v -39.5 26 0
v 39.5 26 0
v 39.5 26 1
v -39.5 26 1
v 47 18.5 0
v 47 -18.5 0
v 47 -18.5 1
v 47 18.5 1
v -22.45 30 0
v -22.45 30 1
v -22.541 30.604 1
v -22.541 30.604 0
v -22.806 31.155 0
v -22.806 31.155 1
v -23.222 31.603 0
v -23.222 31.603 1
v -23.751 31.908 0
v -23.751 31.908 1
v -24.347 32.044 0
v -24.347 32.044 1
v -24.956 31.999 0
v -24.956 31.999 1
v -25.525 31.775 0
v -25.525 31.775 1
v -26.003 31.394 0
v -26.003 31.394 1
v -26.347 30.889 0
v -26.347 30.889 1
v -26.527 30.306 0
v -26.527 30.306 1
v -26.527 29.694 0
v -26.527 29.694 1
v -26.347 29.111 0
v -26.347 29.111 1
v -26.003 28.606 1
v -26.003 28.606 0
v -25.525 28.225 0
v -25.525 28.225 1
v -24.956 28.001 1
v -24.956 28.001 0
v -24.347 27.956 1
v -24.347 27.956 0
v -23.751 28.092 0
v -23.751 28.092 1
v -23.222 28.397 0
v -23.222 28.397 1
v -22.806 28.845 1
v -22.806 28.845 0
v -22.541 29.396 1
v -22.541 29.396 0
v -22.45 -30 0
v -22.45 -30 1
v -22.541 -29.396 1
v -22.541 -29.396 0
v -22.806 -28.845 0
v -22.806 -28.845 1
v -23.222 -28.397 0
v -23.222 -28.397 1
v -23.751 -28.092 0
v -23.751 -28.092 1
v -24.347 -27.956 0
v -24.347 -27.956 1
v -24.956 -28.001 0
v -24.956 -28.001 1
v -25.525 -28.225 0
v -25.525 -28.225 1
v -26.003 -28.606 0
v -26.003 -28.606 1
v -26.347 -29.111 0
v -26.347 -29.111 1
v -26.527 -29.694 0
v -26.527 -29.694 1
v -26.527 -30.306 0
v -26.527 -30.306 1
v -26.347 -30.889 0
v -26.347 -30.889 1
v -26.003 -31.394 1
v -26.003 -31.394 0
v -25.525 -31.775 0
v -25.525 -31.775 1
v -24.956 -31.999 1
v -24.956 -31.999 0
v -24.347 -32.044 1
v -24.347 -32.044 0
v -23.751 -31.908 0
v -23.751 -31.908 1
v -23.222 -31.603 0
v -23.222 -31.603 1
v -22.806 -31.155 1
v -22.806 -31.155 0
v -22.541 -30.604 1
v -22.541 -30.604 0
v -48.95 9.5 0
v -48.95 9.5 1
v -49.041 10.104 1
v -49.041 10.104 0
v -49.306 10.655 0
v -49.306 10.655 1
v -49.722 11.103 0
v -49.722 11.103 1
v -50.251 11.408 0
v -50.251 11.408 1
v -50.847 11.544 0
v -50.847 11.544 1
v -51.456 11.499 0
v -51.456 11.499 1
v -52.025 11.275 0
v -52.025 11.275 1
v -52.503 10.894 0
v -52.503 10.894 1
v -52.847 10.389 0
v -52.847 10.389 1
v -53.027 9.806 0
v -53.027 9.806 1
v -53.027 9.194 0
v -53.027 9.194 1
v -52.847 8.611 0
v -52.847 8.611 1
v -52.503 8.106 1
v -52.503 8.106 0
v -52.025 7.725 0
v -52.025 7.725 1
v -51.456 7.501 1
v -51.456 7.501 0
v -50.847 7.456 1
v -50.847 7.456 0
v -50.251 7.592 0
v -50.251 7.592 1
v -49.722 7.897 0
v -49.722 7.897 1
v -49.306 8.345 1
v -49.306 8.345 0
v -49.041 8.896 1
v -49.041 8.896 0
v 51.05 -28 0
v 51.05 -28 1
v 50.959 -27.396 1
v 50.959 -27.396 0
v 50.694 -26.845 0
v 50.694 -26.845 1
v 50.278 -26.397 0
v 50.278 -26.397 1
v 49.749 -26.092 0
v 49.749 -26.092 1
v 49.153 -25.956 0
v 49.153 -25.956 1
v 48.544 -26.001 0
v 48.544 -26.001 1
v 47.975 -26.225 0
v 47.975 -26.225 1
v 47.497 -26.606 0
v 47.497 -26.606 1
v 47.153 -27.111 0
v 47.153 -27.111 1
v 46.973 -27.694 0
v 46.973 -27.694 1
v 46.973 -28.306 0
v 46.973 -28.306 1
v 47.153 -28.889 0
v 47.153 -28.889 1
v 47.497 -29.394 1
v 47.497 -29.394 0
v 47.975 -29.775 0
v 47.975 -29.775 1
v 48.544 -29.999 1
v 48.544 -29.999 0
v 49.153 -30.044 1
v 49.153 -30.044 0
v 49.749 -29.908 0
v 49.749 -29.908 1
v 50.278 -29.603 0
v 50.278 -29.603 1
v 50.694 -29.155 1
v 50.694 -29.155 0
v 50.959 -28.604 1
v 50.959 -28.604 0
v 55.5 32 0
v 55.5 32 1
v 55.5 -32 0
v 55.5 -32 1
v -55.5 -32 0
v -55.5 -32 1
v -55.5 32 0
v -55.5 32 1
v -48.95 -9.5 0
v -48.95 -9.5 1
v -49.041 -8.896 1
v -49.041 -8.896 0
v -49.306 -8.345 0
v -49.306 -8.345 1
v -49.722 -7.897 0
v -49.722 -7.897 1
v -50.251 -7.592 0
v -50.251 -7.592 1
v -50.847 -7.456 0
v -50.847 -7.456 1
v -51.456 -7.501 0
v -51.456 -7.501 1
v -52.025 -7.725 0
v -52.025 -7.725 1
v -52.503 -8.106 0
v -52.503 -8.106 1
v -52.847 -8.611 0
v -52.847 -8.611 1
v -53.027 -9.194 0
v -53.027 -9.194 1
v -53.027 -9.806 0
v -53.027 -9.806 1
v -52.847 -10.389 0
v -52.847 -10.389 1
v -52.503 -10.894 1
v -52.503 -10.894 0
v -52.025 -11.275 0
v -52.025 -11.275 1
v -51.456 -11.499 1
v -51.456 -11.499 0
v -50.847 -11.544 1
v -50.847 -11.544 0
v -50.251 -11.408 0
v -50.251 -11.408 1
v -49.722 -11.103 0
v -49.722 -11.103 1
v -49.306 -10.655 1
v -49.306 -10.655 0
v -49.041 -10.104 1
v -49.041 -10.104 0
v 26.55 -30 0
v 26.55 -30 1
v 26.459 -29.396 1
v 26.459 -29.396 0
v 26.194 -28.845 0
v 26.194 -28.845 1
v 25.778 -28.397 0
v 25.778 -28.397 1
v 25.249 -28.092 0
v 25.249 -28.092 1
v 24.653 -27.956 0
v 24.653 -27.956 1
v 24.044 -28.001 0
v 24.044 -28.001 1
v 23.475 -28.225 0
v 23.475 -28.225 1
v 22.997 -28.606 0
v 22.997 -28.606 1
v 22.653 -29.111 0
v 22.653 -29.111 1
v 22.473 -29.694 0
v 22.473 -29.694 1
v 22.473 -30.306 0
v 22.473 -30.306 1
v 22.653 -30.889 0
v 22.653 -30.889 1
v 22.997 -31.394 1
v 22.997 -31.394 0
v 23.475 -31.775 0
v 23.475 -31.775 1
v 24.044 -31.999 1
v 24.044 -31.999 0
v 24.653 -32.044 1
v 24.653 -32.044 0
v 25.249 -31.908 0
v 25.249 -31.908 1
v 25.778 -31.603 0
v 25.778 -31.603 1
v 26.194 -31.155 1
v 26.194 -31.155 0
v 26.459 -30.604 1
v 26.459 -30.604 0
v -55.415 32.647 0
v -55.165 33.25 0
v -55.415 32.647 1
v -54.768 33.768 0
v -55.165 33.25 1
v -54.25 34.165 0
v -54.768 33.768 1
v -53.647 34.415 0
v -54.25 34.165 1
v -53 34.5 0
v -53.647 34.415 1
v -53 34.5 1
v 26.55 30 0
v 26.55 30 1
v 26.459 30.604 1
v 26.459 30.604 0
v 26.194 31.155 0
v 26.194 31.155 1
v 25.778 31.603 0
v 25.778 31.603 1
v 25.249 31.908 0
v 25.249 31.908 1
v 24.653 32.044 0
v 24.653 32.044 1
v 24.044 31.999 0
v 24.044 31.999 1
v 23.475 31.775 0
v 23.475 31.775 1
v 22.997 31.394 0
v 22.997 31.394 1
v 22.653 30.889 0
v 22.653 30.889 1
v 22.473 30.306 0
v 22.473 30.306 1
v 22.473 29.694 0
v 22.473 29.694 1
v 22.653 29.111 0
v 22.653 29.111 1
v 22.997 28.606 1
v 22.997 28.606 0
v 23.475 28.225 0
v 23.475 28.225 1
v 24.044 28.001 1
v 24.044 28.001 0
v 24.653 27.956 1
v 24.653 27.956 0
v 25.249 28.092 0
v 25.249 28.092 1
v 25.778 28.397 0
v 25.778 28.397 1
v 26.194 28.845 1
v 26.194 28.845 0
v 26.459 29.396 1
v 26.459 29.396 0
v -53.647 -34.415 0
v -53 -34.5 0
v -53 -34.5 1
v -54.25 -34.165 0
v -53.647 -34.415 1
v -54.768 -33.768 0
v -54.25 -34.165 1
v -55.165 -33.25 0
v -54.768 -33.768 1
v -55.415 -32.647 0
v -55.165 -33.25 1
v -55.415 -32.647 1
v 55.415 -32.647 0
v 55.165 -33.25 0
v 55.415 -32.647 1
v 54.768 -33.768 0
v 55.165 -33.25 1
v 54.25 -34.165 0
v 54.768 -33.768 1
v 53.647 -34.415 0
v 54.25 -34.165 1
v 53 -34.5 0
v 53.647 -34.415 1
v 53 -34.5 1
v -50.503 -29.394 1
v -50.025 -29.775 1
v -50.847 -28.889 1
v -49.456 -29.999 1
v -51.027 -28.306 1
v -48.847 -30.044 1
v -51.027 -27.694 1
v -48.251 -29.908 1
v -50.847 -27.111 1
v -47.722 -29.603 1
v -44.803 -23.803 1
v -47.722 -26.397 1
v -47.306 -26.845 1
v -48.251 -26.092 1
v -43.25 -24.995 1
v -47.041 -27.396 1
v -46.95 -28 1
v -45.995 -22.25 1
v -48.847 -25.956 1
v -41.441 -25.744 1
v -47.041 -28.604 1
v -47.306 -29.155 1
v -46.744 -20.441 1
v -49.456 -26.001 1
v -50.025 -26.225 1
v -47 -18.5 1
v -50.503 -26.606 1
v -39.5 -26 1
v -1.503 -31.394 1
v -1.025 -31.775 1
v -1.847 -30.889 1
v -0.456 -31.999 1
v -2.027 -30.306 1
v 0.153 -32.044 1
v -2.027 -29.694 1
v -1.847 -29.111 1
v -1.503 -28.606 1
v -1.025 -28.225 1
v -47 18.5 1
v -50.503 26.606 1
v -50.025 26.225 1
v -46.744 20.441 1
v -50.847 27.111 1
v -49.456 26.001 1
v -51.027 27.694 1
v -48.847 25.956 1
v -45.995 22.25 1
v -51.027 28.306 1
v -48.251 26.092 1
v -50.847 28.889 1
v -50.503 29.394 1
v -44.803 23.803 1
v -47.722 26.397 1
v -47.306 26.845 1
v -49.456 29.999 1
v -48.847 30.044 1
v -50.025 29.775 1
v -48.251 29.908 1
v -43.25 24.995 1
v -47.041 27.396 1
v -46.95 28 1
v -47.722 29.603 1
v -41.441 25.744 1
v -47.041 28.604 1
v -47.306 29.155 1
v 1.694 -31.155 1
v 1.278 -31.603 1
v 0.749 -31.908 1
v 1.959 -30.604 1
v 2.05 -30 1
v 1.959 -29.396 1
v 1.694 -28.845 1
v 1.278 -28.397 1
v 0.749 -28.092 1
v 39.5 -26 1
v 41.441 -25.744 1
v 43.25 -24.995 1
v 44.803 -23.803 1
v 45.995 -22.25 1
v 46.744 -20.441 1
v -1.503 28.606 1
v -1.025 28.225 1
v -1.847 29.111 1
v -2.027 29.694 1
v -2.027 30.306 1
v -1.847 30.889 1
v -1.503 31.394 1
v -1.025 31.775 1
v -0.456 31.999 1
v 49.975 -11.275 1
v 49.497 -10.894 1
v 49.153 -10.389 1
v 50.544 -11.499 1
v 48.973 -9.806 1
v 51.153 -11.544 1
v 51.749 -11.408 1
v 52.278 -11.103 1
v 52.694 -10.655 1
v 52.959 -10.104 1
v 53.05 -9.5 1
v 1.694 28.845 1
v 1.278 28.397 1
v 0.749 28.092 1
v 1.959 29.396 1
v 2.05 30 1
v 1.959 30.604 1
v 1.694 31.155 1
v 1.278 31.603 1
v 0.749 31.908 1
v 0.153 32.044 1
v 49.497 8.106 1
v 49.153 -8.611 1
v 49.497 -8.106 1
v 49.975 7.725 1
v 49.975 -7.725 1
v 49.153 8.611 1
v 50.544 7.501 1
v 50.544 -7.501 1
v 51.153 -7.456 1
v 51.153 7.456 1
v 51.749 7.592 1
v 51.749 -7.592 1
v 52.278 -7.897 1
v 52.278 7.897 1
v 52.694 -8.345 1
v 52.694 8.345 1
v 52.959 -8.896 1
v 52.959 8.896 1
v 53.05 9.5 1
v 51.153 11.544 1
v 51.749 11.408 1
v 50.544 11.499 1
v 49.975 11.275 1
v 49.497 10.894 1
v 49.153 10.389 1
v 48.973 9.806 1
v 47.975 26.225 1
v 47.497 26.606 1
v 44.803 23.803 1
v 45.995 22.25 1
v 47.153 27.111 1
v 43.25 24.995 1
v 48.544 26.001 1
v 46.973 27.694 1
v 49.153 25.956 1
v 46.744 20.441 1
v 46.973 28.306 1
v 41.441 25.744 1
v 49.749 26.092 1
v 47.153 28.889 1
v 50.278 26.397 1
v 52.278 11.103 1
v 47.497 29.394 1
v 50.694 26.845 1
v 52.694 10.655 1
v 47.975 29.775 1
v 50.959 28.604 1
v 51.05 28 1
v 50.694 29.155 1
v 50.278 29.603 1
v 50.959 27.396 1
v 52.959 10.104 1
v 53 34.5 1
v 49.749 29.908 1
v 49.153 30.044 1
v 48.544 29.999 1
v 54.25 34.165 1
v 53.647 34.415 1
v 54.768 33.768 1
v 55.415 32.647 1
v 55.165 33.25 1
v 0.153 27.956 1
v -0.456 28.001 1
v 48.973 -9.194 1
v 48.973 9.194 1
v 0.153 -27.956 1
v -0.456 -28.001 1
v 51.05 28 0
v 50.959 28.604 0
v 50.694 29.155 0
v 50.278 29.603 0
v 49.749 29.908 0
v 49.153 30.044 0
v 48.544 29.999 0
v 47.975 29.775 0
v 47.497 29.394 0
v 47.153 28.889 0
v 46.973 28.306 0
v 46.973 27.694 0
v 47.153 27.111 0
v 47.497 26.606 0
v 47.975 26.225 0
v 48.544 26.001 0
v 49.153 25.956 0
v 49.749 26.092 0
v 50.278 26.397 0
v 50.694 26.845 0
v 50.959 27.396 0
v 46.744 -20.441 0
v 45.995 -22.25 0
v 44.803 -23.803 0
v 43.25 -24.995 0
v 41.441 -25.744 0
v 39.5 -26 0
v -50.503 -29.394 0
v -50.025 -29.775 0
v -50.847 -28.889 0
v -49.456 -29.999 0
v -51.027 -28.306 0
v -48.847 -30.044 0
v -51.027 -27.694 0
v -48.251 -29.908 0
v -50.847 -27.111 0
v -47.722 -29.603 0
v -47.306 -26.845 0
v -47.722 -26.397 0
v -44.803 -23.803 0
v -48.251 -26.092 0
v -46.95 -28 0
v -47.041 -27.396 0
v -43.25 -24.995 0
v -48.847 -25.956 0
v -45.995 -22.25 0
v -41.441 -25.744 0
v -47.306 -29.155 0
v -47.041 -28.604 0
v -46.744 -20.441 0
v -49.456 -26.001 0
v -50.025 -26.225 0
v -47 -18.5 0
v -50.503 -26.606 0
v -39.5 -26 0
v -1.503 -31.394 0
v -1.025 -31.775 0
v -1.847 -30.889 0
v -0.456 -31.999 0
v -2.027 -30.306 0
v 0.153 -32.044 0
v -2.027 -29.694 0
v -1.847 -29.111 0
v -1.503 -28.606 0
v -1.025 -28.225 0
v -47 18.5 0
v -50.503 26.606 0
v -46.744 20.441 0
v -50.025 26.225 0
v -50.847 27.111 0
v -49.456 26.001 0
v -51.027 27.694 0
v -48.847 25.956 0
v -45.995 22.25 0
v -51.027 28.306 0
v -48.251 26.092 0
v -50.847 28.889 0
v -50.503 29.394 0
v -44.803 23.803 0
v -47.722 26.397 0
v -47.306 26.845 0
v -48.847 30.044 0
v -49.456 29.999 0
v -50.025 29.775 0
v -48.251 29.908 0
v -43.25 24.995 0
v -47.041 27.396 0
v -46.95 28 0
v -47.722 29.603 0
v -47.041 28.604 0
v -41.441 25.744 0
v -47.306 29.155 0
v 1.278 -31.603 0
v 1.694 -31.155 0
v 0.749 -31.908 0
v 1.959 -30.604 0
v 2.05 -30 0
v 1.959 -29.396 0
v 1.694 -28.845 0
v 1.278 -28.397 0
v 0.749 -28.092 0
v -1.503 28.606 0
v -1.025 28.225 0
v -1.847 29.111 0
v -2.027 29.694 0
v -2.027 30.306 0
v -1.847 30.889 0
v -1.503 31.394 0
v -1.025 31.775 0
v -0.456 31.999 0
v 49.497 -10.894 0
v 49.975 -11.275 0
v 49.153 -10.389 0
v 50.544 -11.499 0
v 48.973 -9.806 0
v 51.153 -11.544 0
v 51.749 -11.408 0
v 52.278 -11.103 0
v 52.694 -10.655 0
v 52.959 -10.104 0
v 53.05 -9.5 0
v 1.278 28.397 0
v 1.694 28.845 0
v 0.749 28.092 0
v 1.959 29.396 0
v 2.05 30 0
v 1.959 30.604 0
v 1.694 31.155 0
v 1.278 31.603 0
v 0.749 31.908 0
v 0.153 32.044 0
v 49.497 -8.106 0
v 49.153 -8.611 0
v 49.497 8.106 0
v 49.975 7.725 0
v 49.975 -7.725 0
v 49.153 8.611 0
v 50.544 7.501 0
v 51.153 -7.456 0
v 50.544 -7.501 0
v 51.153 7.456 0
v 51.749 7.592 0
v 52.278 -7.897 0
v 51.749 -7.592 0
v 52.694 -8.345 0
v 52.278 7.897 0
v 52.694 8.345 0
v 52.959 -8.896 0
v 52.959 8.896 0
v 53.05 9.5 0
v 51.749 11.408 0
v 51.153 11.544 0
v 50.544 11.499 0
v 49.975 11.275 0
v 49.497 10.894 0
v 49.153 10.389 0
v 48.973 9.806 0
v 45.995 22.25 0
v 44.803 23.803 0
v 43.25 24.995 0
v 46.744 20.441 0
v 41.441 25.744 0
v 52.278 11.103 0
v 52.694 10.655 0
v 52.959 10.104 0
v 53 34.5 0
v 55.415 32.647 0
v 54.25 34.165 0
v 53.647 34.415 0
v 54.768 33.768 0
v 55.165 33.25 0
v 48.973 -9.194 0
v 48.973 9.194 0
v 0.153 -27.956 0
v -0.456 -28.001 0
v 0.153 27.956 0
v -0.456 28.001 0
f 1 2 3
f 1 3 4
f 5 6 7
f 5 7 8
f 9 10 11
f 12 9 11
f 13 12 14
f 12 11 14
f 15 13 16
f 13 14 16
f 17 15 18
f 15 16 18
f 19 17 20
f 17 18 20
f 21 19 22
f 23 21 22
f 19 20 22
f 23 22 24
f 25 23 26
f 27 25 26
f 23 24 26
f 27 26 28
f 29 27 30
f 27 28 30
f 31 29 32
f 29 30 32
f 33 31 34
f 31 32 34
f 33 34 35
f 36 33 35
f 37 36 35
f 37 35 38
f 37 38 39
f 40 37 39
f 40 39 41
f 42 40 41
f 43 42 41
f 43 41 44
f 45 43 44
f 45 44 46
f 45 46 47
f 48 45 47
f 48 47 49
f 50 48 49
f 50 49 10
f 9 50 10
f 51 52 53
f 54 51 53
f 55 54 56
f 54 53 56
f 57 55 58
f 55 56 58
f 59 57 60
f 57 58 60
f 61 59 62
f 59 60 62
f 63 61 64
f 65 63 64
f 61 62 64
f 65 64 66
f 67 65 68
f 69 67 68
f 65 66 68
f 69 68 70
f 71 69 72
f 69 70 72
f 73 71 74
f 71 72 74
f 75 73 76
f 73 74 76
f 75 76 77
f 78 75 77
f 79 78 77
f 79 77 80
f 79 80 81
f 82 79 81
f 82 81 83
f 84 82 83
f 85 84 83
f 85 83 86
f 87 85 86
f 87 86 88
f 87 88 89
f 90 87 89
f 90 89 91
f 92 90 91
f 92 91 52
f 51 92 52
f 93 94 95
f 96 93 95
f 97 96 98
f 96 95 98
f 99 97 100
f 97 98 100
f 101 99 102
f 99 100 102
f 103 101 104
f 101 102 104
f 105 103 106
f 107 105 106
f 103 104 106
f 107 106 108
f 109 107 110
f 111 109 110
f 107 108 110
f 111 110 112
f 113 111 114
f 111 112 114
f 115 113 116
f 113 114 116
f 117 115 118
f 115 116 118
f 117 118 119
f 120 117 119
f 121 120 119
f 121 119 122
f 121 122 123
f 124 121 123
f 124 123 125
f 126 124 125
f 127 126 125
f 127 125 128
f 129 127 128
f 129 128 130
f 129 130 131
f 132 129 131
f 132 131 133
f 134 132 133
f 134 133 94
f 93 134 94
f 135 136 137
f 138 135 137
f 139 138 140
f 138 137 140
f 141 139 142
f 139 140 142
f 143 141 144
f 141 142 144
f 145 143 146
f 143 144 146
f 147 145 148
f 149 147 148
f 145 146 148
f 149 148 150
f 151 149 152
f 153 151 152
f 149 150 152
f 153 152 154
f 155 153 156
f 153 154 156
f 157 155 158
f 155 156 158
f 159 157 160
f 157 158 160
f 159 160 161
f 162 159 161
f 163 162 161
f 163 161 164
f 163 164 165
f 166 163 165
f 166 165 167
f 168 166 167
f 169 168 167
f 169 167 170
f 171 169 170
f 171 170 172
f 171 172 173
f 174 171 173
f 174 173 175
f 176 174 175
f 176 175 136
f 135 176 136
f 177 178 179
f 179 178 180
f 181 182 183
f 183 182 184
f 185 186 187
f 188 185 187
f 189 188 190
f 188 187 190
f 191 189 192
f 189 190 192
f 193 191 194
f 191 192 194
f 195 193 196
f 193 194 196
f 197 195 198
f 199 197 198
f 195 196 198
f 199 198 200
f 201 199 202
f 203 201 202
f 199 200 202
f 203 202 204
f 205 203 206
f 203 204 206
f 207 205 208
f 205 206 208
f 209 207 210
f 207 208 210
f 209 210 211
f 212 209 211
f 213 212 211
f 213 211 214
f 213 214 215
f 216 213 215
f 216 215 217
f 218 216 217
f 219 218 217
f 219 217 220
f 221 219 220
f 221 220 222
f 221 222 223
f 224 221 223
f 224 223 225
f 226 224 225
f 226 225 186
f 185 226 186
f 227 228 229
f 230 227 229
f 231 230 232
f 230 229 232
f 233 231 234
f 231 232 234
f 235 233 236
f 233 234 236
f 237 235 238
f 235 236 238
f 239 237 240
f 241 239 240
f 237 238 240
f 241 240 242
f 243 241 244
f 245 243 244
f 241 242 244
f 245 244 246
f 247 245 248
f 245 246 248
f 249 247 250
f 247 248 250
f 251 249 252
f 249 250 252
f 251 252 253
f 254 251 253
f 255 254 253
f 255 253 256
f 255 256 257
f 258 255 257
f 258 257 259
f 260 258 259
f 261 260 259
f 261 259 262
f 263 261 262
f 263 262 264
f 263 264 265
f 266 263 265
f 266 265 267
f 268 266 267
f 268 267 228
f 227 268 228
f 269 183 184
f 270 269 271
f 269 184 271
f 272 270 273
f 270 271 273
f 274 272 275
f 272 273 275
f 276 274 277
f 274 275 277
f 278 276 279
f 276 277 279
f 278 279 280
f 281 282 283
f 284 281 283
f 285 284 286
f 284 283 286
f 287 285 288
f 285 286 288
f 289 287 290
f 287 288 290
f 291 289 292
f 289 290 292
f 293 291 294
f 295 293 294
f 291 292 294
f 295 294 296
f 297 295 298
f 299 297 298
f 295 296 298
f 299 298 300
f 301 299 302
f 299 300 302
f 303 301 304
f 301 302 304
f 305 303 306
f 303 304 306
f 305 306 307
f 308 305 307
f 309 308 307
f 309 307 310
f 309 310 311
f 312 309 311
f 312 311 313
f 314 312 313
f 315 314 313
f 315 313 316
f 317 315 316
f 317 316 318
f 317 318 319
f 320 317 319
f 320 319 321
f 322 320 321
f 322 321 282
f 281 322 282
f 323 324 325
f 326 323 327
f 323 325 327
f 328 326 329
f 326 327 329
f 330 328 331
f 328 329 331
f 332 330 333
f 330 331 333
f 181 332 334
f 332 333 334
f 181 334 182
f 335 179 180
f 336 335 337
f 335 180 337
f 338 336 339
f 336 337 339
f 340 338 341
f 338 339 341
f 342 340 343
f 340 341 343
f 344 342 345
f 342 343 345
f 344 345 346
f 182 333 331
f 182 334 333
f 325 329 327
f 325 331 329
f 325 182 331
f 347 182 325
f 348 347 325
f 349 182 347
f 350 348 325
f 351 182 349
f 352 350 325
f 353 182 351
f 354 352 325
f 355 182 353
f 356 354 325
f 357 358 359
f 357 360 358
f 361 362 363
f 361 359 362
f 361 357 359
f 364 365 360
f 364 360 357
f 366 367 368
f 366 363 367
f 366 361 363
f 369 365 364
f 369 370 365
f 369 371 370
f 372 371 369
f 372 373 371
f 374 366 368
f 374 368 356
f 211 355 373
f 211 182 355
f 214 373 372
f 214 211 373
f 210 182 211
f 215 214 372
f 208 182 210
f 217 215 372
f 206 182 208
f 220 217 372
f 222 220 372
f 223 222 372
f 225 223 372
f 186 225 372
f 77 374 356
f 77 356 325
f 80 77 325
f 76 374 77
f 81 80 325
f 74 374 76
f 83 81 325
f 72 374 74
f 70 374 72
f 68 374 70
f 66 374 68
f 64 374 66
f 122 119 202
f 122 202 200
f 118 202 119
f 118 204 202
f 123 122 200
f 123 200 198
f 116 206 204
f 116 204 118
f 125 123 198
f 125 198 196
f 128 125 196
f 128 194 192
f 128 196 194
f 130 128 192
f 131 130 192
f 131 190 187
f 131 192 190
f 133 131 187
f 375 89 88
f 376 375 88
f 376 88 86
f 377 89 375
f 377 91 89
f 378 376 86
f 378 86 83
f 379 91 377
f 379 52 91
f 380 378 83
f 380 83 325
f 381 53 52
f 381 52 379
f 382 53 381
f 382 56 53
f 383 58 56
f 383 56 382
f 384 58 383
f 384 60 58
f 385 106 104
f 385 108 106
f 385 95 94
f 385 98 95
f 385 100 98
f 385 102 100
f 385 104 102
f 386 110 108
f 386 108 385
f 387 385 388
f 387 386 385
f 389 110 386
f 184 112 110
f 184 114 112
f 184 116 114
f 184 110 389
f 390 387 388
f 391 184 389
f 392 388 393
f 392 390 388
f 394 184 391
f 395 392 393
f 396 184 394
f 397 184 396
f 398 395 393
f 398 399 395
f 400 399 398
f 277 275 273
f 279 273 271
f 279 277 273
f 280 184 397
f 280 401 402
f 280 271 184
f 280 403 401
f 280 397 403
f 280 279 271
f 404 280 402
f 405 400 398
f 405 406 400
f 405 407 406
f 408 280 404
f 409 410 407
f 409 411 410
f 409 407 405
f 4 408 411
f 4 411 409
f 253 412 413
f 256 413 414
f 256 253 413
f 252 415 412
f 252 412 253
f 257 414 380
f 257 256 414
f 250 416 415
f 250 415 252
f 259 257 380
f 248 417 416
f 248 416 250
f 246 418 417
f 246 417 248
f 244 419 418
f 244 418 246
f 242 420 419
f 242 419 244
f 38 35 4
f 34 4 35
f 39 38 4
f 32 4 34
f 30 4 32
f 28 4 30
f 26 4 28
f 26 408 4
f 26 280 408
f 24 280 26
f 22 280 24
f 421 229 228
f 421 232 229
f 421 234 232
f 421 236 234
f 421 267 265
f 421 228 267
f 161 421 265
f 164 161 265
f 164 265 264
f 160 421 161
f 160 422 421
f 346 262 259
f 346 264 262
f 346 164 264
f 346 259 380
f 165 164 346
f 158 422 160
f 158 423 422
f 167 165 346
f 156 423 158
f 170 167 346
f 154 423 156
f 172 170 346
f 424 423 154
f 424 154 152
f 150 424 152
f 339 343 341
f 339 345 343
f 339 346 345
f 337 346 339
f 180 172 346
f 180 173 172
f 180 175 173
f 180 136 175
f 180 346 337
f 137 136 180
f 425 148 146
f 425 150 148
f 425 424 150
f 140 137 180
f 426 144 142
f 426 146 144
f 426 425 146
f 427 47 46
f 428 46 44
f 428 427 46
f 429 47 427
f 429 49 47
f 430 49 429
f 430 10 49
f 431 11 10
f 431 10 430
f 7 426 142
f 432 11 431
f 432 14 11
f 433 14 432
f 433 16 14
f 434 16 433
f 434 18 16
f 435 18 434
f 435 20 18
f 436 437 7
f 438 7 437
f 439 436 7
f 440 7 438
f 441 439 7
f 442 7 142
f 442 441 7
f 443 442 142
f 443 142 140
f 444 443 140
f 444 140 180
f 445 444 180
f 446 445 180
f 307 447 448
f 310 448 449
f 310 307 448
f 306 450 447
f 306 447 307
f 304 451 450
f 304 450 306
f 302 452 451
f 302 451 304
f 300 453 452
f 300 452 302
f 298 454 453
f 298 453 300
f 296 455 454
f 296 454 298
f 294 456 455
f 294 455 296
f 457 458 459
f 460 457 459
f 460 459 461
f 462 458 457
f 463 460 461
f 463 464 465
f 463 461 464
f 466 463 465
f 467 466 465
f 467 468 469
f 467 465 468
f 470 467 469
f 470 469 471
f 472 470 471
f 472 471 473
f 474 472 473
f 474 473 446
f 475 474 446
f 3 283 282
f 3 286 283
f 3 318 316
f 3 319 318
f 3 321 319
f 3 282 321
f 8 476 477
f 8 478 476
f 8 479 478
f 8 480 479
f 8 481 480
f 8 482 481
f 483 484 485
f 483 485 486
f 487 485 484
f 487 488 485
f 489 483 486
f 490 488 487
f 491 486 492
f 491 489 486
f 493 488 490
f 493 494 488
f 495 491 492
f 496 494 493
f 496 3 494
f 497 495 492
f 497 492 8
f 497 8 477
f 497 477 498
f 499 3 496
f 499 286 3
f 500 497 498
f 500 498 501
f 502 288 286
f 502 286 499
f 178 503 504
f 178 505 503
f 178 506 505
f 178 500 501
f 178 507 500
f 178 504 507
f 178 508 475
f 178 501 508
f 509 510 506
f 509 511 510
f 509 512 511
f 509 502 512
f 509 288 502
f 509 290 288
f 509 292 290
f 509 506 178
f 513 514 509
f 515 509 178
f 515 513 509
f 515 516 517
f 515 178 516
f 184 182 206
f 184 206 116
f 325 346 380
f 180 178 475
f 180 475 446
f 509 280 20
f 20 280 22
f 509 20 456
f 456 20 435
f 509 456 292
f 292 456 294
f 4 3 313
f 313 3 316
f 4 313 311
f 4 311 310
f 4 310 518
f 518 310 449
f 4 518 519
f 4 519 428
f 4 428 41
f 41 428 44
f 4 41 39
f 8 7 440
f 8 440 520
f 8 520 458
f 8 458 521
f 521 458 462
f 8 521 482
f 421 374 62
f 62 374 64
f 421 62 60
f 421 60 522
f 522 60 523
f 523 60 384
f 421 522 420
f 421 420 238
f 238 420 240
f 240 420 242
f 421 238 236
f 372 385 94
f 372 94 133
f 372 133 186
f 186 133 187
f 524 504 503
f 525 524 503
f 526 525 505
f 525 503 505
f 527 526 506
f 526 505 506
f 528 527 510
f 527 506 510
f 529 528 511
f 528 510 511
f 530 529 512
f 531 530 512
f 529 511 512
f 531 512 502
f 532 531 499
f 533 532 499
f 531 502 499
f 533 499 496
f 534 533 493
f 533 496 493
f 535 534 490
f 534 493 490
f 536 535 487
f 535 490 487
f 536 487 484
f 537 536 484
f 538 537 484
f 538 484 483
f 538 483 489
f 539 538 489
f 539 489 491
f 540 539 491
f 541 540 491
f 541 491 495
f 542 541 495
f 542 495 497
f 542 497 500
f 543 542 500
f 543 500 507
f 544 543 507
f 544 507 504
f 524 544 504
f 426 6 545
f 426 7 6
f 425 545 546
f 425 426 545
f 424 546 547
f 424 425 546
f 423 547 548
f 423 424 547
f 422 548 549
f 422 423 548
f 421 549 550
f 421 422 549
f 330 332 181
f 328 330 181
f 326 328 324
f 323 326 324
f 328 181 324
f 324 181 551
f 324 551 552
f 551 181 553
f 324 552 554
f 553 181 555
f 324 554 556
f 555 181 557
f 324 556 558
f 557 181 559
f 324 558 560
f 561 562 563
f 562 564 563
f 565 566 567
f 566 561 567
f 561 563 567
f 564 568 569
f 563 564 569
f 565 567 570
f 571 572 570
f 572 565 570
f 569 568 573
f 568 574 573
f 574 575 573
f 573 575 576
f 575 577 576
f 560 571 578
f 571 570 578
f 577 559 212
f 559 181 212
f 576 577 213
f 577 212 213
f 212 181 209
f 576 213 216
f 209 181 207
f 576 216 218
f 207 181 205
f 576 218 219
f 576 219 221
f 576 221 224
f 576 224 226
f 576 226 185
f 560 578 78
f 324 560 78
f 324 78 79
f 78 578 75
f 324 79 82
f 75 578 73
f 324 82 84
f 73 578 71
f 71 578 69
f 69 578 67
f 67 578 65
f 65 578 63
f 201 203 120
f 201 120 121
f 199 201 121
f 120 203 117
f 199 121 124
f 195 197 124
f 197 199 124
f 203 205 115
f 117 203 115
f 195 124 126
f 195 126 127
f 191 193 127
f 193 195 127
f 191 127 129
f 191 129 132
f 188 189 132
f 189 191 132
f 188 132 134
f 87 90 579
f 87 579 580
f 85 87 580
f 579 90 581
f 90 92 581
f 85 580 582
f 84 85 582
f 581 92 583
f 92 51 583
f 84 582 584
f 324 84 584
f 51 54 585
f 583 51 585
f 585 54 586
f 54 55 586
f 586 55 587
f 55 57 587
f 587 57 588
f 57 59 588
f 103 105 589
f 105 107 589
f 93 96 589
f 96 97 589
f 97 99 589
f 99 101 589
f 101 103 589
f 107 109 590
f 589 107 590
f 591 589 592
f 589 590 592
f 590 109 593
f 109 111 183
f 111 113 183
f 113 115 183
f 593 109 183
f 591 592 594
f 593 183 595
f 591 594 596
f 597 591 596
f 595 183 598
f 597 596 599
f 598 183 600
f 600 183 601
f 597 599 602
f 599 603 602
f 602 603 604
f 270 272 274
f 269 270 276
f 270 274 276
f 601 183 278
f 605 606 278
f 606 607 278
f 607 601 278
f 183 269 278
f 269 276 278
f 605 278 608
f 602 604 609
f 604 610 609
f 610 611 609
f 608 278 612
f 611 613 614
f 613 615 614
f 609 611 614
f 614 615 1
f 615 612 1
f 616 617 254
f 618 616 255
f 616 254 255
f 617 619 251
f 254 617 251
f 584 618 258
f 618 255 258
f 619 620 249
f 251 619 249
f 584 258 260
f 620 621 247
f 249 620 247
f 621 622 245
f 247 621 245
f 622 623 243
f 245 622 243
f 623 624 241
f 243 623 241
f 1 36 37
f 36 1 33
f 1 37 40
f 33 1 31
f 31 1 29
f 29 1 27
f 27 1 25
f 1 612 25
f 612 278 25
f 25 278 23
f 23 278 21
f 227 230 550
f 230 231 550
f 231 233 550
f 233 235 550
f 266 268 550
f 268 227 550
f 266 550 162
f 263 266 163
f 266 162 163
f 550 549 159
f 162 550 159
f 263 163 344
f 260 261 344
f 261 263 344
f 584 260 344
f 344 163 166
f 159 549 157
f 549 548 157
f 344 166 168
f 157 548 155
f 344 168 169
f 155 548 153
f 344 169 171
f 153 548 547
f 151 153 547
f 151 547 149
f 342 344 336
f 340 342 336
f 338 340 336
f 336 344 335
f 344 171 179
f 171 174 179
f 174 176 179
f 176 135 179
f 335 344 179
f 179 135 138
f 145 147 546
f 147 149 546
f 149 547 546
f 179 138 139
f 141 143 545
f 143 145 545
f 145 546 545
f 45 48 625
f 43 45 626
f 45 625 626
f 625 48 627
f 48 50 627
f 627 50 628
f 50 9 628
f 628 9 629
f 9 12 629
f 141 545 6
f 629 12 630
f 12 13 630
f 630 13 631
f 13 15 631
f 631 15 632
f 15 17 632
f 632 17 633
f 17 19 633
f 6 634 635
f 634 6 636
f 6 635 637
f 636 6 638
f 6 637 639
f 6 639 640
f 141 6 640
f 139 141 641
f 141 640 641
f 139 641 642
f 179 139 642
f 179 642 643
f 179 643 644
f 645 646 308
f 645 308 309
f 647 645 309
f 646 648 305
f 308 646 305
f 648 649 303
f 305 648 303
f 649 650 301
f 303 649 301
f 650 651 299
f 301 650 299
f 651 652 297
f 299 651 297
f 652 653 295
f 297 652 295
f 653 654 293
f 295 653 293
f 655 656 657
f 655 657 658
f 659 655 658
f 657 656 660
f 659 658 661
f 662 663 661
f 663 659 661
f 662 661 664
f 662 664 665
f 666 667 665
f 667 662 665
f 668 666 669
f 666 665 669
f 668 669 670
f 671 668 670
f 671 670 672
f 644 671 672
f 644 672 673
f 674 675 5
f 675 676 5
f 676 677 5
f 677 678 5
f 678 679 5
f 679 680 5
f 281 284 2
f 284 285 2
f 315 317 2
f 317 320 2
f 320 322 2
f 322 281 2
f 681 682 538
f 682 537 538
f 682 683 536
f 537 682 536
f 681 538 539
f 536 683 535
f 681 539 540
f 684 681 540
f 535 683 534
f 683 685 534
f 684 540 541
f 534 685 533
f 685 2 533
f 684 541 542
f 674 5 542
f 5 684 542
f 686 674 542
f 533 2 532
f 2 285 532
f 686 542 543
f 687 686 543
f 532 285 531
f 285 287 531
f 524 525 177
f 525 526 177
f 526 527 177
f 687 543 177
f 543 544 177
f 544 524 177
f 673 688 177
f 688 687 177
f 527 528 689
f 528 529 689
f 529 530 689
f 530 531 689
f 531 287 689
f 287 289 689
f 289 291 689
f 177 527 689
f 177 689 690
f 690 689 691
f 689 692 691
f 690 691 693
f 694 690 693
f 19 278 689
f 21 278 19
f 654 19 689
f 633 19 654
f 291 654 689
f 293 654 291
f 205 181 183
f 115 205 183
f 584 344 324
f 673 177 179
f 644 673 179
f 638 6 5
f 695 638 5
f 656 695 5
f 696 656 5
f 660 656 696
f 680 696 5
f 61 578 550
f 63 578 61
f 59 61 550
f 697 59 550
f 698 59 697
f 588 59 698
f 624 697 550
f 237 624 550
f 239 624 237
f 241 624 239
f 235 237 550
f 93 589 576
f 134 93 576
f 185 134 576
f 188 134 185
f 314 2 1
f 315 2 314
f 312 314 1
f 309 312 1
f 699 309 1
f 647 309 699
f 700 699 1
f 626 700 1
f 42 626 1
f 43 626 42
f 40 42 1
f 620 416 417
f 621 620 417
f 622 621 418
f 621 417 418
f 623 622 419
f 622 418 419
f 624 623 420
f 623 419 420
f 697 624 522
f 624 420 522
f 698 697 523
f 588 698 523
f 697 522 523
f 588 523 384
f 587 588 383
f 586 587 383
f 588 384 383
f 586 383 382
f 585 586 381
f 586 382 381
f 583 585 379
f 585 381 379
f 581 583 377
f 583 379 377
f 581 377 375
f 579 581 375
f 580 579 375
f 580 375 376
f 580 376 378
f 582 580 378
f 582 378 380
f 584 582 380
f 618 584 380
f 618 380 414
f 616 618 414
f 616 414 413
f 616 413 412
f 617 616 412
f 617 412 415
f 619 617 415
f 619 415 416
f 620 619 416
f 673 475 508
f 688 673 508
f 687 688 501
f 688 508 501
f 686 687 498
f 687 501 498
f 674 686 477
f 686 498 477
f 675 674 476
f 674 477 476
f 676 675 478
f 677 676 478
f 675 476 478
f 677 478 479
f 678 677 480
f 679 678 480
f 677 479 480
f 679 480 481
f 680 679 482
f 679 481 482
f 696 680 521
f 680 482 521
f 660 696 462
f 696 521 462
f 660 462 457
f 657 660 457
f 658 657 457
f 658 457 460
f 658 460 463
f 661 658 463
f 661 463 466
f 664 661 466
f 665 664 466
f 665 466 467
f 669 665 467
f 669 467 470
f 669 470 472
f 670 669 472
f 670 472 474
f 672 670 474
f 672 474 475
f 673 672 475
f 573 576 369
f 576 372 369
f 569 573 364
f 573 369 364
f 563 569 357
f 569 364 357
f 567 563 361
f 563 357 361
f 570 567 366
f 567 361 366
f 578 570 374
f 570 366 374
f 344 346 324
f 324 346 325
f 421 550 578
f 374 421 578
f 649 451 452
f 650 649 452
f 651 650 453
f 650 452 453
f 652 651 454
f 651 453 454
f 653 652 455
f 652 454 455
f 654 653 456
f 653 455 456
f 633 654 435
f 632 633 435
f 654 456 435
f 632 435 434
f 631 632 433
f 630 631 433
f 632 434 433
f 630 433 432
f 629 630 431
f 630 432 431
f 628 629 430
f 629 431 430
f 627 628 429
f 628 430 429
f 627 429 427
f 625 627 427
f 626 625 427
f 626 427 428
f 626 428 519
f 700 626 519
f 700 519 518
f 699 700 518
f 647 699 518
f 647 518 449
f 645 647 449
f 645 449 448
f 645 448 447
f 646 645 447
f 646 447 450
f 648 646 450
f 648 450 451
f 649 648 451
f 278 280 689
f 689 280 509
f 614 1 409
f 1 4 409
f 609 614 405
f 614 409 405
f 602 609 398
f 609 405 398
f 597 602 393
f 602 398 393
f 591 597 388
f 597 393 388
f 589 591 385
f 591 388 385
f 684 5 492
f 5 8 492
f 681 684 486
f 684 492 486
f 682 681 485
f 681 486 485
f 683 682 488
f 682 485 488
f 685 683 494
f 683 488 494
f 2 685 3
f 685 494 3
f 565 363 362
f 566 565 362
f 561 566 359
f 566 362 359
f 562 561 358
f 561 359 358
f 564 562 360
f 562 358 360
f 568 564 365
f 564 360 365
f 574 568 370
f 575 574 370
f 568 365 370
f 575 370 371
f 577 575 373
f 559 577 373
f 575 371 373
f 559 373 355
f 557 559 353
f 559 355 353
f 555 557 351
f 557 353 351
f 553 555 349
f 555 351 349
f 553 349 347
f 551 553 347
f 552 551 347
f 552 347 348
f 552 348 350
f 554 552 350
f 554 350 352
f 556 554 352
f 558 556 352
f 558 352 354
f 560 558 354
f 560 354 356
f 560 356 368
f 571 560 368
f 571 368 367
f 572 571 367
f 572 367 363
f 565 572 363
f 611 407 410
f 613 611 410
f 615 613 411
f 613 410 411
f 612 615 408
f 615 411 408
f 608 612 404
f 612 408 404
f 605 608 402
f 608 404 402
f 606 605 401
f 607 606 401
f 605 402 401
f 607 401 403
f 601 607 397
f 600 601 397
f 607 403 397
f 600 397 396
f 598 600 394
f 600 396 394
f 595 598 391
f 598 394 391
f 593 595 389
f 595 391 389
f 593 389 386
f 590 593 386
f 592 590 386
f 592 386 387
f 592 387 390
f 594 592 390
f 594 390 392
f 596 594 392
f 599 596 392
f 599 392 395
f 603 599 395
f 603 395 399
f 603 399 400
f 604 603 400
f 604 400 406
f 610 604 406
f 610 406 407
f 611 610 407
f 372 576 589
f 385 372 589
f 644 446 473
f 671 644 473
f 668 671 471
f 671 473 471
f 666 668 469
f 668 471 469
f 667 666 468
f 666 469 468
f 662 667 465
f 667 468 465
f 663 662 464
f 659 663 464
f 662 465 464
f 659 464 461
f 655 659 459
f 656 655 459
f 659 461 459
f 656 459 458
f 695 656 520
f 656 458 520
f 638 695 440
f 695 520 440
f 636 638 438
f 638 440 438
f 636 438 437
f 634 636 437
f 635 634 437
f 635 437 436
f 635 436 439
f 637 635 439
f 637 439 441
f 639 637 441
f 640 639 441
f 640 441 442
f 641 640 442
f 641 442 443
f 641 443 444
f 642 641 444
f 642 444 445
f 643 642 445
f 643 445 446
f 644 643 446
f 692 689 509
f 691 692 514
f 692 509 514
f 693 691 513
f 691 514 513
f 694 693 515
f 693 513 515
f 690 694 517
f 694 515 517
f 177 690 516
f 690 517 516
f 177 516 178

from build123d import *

# Parameters (mm, degrees)
SKETCH1_W           = 112
SKETCH1_H           = 70
BOSS_EXTRUDE1_DEPTH = 1
FILLET1_R           = 3
SKETCH3_W           = 94
SKETCH3_H           = 52
CUT_EXTRUDE2_DEPTH  = 67.045438904
FILLET2_R           = 7.5
CUT_EXTRUDE3_REACH  = 68.045
SKETCH4_R           = 1.6
SKETCH5_R           = 2.05
CUT_EXTRUDE4_DEPTH  = 67.045438904
SKETCH6_W           = 132
SKETCH6_H           = 90
CUT_EXTRUDE5_DEPTH  = 67.045438904


with BuildPart() as part:
    # Sketch1 → Boss-Extrude1 (new body)
    with BuildSketch(Plane.XY):
        Rectangle(SKETCH1_W, SKETCH1_H)
    extrude(amount=BOSS_EXTRUDE1_DEPTH)

    # Fillet1
    fillet1_edges = [part.edges().sort_by_distance(p)[0] for p in [
        (-56, 35, 0.5),
        (56, 35, 0.5),
        (56, -35, 0.5),
        (-56, -35, 0.5),
    ]]
    fillet(fillet1_edges, radius=FILLET1_R)

    # Sketch3 → Cut-Extrude2 (cut, through all)
    with BuildSketch(Plane(origin=(0, 0, 0), x_dir=(-1, 0, 0), z_dir=(0, 0, -1))):
        Rectangle(SKETCH3_W, SKETCH3_H)
    extrude(amount=-CUT_EXTRUDE2_DEPTH, mode=Mode.SUBTRACT)

    # Fillet2
    fillet2_edges = [part.edges().sort_by_distance(p)[0] for p in [
        (-47, 26, 0.5),
        (-47, -26, 0.5),
        (47, -26, 0.5),
        (47, 26, 0.5),
    ]]
    fillet(fillet2_edges, radius=FILLET2_R)

    # Sketch4 → Cut-Extrude3 (cut, up to next)
    with BuildSketch(Plane(origin=(0, 0, 0), x_dir=(-1, 0, 0), z_dir=(0, 0, -1)), mode=Mode.PRIVATE) as cut_extrude3_sk1:
        with Locations((49, -28)):
            Circle(SKETCH4_R)
    cut_extrude3_tool1 = extrude(cut_extrude3_sk1.sketch, amount=-CUT_EXTRUDE3_REACH, mode=Mode.PRIVATE) & part.part
    # Sketch4 → Cut-Extrude3 (cut, up to next)
    with BuildSketch(Plane(origin=(0, 0, 0), x_dir=(-1, 0, 0), z_dir=(0, 0, -1)), mode=Mode.PRIVATE) as cut_extrude3_sk2:
        with Locations((24.5, -30)):
            Circle(SKETCH4_R)
    cut_extrude3_tool2 = extrude(cut_extrude3_sk2.sketch, amount=-CUT_EXTRUDE3_REACH, mode=Mode.PRIVATE) & part.part
    # Sketch4 → Cut-Extrude3 (cut, up to next)
    with BuildSketch(Plane(origin=(0, 0, 0), x_dir=(-1, 0, 0), z_dir=(0, 0, -1)), mode=Mode.PRIVATE) as cut_extrude3_sk3:
        with Locations((0, -30)):
            Circle(SKETCH4_R)
    cut_extrude3_tool3 = extrude(cut_extrude3_sk3.sketch, amount=-CUT_EXTRUDE3_REACH, mode=Mode.PRIVATE) & part.part
    # Sketch4 → Cut-Extrude3 (cut, up to next)
    with BuildSketch(Plane(origin=(0, 0, 0), x_dir=(-1, 0, 0), z_dir=(0, 0, -1)), mode=Mode.PRIVATE) as cut_extrude3_sk4:
        with Locations((-24.5, -30)):
            Circle(SKETCH4_R)
    cut_extrude3_tool4 = extrude(cut_extrude3_sk4.sketch, amount=-CUT_EXTRUDE3_REACH, mode=Mode.PRIVATE) & part.part
    # Sketch4 → Cut-Extrude3 (cut, up to next)
    with BuildSketch(Plane(origin=(0, 0, 0), x_dir=(-1, 0, 0), z_dir=(0, 0, -1)), mode=Mode.PRIVATE) as cut_extrude3_sk5:
        with Locations((-49, -28)):
            Circle(SKETCH4_R)
    cut_extrude3_tool5 = extrude(cut_extrude3_sk5.sketch, amount=-CUT_EXTRUDE3_REACH, mode=Mode.PRIVATE) & part.part
    # Sketch4 → Cut-Extrude3 (cut, up to next)
    with BuildSketch(Plane(origin=(0, 0, 0), x_dir=(-1, 0, 0), z_dir=(0, 0, -1)), mode=Mode.PRIVATE) as cut_extrude3_sk6:
        with Locations((-51, -9.5)):
            Circle(SKETCH4_R)
    cut_extrude3_tool6 = extrude(cut_extrude3_sk6.sketch, amount=-CUT_EXTRUDE3_REACH, mode=Mode.PRIVATE) & part.part
    # Sketch4 → Cut-Extrude3 (cut, up to next)
    with BuildSketch(Plane(origin=(0, 0, 0), x_dir=(-1, 0, 0), z_dir=(0, 0, -1)), mode=Mode.PRIVATE) as cut_extrude3_sk7:
        with Locations((-51, 9.5)):
            Circle(SKETCH4_R)
    cut_extrude3_tool7 = extrude(cut_extrude3_sk7.sketch, amount=-CUT_EXTRUDE3_REACH, mode=Mode.PRIVATE) & part.part
    # Sketch4 → Cut-Extrude3 (cut, up to next)
    with BuildSketch(Plane(origin=(0, 0, 0), x_dir=(-1, 0, 0), z_dir=(0, 0, -1)), mode=Mode.PRIVATE) as cut_extrude3_sk8:
        with Locations((-49, 28)):
            Circle(SKETCH4_R)
    cut_extrude3_tool8 = extrude(cut_extrude3_sk8.sketch, amount=-CUT_EXTRUDE3_REACH, mode=Mode.PRIVATE) & part.part
    # Sketch4 → Cut-Extrude3 (cut, up to next)
    with BuildSketch(Plane(origin=(0, 0, 0), x_dir=(-1, 0, 0), z_dir=(0, 0, -1)), mode=Mode.PRIVATE) as cut_extrude3_sk9:
        with Locations((-24.5, 30)):
            Circle(SKETCH4_R)
    cut_extrude3_tool9 = extrude(cut_extrude3_sk9.sketch, amount=-CUT_EXTRUDE3_REACH, mode=Mode.PRIVATE) & part.part
    # Sketch4 → Cut-Extrude3 (cut, up to next)
    with BuildSketch(Plane(origin=(0, 0, 0), x_dir=(-1, 0, 0), z_dir=(0, 0, -1)), mode=Mode.PRIVATE) as cut_extrude3_sk10:
        with Locations((0, 30)):
            Circle(SKETCH4_R)
    cut_extrude3_tool10 = extrude(cut_extrude3_sk10.sketch, amount=-CUT_EXTRUDE3_REACH, mode=Mode.PRIVATE) & part.part
    # Sketch4 → Cut-Extrude3 (cut, up to next)
    with BuildSketch(Plane(origin=(0, 0, 0), x_dir=(-1, 0, 0), z_dir=(0, 0, -1)), mode=Mode.PRIVATE) as cut_extrude3_sk11:
        with Locations((24.5, 30)):
            Circle(SKETCH4_R)
    cut_extrude3_tool11 = extrude(cut_extrude3_sk11.sketch, amount=-CUT_EXTRUDE3_REACH, mode=Mode.PRIVATE) & part.part
    # Sketch4 → Cut-Extrude3 (cut, up to next)
    with BuildSketch(Plane(origin=(0, 0, 0), x_dir=(-1, 0, 0), z_dir=(0, 0, -1)), mode=Mode.PRIVATE) as cut_extrude3_sk12:
        with Locations((49, 28)):
            Circle(SKETCH4_R)
    cut_extrude3_tool12 = extrude(cut_extrude3_sk12.sketch, amount=-CUT_EXTRUDE3_REACH, mode=Mode.PRIVATE) & part.part
    # Sketch4 → Cut-Extrude3 (cut, up to next)
    with BuildSketch(Plane(origin=(0, 0, 0), x_dir=(-1, 0, 0), z_dir=(0, 0, -1)), mode=Mode.PRIVATE) as cut_extrude3_sk13:
        with Locations((51, 9.5)):
            Circle(SKETCH4_R)
    cut_extrude3_tool13 = extrude(cut_extrude3_sk13.sketch, amount=-CUT_EXTRUDE3_REACH, mode=Mode.PRIVATE) & part.part
    # Sketch4 → Cut-Extrude3 (cut, up to next)
    with BuildSketch(Plane(origin=(0, 0, 0), x_dir=(-1, 0, 0), z_dir=(0, 0, -1)), mode=Mode.PRIVATE) as cut_extrude3_sk14:
        with Locations((51, -9.5)):
            Circle(SKETCH4_R)
    cut_extrude3_tool14 = extrude(cut_extrude3_sk14.sketch, amount=-CUT_EXTRUDE3_REACH, mode=Mode.PRIVATE) & part.part
    add(cut_extrude3_tool1.solids().sort_by_distance((-49, -28, 0))[0], mode=Mode.SUBTRACT)
    add(cut_extrude3_tool2.solids().sort_by_distance((-24.5, -30, 0))[0], mode=Mode.SUBTRACT)
    add(cut_extrude3_tool3.solids().sort_by_distance((0, -30, 0))[0], mode=Mode.SUBTRACT)
    add(cut_extrude3_tool4.solids().sort_by_distance((24.5, -30, 0))[0], mode=Mode.SUBTRACT)
    add(cut_extrude3_tool5.solids().sort_by_distance((49, -28, 0))[0], mode=Mode.SUBTRACT)
    add(cut_extrude3_tool6.solids().sort_by_distance((51, -9.5, 0))[0], mode=Mode.SUBTRACT)
    add(cut_extrude3_tool7.solids().sort_by_distance((51, 9.5, 0))[0], mode=Mode.SUBTRACT)
    add(cut_extrude3_tool8.solids().sort_by_distance((49, 28, 0))[0], mode=Mode.SUBTRACT)
    add(cut_extrude3_tool9.solids().sort_by_distance((24.5, 30, 0))[0], mode=Mode.SUBTRACT)
    add(cut_extrude3_tool10.solids().sort_by_distance((0, 30, 0))[0], mode=Mode.SUBTRACT)
    add(cut_extrude3_tool11.solids().sort_by_distance((-24.5, 30, 0))[0], mode=Mode.SUBTRACT)
    add(cut_extrude3_tool12.solids().sort_by_distance((-49, 28, 0))[0], mode=Mode.SUBTRACT)
    add(cut_extrude3_tool13.solids().sort_by_distance((-51, 9.5, 0))[0], mode=Mode.SUBTRACT)
    add(cut_extrude3_tool14.solids().sort_by_distance((-51, -9.5, 0))[0], mode=Mode.SUBTRACT)

    # Sketch5 → Cut-Extrude4 (cut, through all)
    with BuildSketch(Plane.XY.offset(1)):
        with Locations((-49, 28)):
            Circle(SKETCH5_R)
        with Locations((-24.5, 30)):
            Circle(SKETCH5_R)
        with Locations((0, 30)):
            Circle(SKETCH5_R)
        with Locations((24.5, 30)):
            Circle(SKETCH5_R)
        with Locations((49, 28)):
            Circle(SKETCH5_R)
        with Locations((51, 9.5)):
            Circle(SKETCH5_R)
        with Locations((51, -9.5)):
            Circle(SKETCH5_R)
        with Locations((49, -28)):
            Circle(SKETCH5_R)
        with Locations((24.5, -30)):
            Circle(SKETCH5_R)
        with Locations((0, -30)):
            Circle(SKETCH5_R)
        with Locations((-24.5, -30)):
            Circle(SKETCH5_R)
        with Locations((-49, -28)):
            Circle(SKETCH5_R)
        with Locations((-51, -9.5)):
            Circle(SKETCH5_R)
        with Locations((-51, 9.5)):
            Circle(SKETCH5_R)
    extrude(amount=-CUT_EXTRUDE4_DEPTH, mode=Mode.SUBTRACT)

    # Sketch6 → Cut-Extrude5 (cut, through all)
    with BuildSketch(Plane.XY.offset(1)):
        Rectangle(SKETCH6_W, SKETCH6_H)
        with BuildLine():
            Line((-53, 34.5), (53, 34.5))
            ThreePointArc((53, 34.5), (54.767766953, 33.767766953), (55.5, 32))
            Line((55.5, 32), (55.5, -32))
            ThreePointArc((55.5, -32), (54.767766953, -33.767766953), (53, -34.5))
            Line((53, -34.5), (-53, -34.5))
            ThreePointArc((-53, -34.5), (-54.767766953, -33.767766953), (-55.5, -32))
            Line((-55.5, -32), (-55.5, 32))
            ThreePointArc((-55.5, 32), (-54.767766953, 33.767766953), (-53, 34.5))
        make_face(mode=Mode.SUBTRACT)
    extrude(amount=-CUT_EXTRUDE5_DEPTH, mode=Mode.SUBTRACT)


solid = part.part
